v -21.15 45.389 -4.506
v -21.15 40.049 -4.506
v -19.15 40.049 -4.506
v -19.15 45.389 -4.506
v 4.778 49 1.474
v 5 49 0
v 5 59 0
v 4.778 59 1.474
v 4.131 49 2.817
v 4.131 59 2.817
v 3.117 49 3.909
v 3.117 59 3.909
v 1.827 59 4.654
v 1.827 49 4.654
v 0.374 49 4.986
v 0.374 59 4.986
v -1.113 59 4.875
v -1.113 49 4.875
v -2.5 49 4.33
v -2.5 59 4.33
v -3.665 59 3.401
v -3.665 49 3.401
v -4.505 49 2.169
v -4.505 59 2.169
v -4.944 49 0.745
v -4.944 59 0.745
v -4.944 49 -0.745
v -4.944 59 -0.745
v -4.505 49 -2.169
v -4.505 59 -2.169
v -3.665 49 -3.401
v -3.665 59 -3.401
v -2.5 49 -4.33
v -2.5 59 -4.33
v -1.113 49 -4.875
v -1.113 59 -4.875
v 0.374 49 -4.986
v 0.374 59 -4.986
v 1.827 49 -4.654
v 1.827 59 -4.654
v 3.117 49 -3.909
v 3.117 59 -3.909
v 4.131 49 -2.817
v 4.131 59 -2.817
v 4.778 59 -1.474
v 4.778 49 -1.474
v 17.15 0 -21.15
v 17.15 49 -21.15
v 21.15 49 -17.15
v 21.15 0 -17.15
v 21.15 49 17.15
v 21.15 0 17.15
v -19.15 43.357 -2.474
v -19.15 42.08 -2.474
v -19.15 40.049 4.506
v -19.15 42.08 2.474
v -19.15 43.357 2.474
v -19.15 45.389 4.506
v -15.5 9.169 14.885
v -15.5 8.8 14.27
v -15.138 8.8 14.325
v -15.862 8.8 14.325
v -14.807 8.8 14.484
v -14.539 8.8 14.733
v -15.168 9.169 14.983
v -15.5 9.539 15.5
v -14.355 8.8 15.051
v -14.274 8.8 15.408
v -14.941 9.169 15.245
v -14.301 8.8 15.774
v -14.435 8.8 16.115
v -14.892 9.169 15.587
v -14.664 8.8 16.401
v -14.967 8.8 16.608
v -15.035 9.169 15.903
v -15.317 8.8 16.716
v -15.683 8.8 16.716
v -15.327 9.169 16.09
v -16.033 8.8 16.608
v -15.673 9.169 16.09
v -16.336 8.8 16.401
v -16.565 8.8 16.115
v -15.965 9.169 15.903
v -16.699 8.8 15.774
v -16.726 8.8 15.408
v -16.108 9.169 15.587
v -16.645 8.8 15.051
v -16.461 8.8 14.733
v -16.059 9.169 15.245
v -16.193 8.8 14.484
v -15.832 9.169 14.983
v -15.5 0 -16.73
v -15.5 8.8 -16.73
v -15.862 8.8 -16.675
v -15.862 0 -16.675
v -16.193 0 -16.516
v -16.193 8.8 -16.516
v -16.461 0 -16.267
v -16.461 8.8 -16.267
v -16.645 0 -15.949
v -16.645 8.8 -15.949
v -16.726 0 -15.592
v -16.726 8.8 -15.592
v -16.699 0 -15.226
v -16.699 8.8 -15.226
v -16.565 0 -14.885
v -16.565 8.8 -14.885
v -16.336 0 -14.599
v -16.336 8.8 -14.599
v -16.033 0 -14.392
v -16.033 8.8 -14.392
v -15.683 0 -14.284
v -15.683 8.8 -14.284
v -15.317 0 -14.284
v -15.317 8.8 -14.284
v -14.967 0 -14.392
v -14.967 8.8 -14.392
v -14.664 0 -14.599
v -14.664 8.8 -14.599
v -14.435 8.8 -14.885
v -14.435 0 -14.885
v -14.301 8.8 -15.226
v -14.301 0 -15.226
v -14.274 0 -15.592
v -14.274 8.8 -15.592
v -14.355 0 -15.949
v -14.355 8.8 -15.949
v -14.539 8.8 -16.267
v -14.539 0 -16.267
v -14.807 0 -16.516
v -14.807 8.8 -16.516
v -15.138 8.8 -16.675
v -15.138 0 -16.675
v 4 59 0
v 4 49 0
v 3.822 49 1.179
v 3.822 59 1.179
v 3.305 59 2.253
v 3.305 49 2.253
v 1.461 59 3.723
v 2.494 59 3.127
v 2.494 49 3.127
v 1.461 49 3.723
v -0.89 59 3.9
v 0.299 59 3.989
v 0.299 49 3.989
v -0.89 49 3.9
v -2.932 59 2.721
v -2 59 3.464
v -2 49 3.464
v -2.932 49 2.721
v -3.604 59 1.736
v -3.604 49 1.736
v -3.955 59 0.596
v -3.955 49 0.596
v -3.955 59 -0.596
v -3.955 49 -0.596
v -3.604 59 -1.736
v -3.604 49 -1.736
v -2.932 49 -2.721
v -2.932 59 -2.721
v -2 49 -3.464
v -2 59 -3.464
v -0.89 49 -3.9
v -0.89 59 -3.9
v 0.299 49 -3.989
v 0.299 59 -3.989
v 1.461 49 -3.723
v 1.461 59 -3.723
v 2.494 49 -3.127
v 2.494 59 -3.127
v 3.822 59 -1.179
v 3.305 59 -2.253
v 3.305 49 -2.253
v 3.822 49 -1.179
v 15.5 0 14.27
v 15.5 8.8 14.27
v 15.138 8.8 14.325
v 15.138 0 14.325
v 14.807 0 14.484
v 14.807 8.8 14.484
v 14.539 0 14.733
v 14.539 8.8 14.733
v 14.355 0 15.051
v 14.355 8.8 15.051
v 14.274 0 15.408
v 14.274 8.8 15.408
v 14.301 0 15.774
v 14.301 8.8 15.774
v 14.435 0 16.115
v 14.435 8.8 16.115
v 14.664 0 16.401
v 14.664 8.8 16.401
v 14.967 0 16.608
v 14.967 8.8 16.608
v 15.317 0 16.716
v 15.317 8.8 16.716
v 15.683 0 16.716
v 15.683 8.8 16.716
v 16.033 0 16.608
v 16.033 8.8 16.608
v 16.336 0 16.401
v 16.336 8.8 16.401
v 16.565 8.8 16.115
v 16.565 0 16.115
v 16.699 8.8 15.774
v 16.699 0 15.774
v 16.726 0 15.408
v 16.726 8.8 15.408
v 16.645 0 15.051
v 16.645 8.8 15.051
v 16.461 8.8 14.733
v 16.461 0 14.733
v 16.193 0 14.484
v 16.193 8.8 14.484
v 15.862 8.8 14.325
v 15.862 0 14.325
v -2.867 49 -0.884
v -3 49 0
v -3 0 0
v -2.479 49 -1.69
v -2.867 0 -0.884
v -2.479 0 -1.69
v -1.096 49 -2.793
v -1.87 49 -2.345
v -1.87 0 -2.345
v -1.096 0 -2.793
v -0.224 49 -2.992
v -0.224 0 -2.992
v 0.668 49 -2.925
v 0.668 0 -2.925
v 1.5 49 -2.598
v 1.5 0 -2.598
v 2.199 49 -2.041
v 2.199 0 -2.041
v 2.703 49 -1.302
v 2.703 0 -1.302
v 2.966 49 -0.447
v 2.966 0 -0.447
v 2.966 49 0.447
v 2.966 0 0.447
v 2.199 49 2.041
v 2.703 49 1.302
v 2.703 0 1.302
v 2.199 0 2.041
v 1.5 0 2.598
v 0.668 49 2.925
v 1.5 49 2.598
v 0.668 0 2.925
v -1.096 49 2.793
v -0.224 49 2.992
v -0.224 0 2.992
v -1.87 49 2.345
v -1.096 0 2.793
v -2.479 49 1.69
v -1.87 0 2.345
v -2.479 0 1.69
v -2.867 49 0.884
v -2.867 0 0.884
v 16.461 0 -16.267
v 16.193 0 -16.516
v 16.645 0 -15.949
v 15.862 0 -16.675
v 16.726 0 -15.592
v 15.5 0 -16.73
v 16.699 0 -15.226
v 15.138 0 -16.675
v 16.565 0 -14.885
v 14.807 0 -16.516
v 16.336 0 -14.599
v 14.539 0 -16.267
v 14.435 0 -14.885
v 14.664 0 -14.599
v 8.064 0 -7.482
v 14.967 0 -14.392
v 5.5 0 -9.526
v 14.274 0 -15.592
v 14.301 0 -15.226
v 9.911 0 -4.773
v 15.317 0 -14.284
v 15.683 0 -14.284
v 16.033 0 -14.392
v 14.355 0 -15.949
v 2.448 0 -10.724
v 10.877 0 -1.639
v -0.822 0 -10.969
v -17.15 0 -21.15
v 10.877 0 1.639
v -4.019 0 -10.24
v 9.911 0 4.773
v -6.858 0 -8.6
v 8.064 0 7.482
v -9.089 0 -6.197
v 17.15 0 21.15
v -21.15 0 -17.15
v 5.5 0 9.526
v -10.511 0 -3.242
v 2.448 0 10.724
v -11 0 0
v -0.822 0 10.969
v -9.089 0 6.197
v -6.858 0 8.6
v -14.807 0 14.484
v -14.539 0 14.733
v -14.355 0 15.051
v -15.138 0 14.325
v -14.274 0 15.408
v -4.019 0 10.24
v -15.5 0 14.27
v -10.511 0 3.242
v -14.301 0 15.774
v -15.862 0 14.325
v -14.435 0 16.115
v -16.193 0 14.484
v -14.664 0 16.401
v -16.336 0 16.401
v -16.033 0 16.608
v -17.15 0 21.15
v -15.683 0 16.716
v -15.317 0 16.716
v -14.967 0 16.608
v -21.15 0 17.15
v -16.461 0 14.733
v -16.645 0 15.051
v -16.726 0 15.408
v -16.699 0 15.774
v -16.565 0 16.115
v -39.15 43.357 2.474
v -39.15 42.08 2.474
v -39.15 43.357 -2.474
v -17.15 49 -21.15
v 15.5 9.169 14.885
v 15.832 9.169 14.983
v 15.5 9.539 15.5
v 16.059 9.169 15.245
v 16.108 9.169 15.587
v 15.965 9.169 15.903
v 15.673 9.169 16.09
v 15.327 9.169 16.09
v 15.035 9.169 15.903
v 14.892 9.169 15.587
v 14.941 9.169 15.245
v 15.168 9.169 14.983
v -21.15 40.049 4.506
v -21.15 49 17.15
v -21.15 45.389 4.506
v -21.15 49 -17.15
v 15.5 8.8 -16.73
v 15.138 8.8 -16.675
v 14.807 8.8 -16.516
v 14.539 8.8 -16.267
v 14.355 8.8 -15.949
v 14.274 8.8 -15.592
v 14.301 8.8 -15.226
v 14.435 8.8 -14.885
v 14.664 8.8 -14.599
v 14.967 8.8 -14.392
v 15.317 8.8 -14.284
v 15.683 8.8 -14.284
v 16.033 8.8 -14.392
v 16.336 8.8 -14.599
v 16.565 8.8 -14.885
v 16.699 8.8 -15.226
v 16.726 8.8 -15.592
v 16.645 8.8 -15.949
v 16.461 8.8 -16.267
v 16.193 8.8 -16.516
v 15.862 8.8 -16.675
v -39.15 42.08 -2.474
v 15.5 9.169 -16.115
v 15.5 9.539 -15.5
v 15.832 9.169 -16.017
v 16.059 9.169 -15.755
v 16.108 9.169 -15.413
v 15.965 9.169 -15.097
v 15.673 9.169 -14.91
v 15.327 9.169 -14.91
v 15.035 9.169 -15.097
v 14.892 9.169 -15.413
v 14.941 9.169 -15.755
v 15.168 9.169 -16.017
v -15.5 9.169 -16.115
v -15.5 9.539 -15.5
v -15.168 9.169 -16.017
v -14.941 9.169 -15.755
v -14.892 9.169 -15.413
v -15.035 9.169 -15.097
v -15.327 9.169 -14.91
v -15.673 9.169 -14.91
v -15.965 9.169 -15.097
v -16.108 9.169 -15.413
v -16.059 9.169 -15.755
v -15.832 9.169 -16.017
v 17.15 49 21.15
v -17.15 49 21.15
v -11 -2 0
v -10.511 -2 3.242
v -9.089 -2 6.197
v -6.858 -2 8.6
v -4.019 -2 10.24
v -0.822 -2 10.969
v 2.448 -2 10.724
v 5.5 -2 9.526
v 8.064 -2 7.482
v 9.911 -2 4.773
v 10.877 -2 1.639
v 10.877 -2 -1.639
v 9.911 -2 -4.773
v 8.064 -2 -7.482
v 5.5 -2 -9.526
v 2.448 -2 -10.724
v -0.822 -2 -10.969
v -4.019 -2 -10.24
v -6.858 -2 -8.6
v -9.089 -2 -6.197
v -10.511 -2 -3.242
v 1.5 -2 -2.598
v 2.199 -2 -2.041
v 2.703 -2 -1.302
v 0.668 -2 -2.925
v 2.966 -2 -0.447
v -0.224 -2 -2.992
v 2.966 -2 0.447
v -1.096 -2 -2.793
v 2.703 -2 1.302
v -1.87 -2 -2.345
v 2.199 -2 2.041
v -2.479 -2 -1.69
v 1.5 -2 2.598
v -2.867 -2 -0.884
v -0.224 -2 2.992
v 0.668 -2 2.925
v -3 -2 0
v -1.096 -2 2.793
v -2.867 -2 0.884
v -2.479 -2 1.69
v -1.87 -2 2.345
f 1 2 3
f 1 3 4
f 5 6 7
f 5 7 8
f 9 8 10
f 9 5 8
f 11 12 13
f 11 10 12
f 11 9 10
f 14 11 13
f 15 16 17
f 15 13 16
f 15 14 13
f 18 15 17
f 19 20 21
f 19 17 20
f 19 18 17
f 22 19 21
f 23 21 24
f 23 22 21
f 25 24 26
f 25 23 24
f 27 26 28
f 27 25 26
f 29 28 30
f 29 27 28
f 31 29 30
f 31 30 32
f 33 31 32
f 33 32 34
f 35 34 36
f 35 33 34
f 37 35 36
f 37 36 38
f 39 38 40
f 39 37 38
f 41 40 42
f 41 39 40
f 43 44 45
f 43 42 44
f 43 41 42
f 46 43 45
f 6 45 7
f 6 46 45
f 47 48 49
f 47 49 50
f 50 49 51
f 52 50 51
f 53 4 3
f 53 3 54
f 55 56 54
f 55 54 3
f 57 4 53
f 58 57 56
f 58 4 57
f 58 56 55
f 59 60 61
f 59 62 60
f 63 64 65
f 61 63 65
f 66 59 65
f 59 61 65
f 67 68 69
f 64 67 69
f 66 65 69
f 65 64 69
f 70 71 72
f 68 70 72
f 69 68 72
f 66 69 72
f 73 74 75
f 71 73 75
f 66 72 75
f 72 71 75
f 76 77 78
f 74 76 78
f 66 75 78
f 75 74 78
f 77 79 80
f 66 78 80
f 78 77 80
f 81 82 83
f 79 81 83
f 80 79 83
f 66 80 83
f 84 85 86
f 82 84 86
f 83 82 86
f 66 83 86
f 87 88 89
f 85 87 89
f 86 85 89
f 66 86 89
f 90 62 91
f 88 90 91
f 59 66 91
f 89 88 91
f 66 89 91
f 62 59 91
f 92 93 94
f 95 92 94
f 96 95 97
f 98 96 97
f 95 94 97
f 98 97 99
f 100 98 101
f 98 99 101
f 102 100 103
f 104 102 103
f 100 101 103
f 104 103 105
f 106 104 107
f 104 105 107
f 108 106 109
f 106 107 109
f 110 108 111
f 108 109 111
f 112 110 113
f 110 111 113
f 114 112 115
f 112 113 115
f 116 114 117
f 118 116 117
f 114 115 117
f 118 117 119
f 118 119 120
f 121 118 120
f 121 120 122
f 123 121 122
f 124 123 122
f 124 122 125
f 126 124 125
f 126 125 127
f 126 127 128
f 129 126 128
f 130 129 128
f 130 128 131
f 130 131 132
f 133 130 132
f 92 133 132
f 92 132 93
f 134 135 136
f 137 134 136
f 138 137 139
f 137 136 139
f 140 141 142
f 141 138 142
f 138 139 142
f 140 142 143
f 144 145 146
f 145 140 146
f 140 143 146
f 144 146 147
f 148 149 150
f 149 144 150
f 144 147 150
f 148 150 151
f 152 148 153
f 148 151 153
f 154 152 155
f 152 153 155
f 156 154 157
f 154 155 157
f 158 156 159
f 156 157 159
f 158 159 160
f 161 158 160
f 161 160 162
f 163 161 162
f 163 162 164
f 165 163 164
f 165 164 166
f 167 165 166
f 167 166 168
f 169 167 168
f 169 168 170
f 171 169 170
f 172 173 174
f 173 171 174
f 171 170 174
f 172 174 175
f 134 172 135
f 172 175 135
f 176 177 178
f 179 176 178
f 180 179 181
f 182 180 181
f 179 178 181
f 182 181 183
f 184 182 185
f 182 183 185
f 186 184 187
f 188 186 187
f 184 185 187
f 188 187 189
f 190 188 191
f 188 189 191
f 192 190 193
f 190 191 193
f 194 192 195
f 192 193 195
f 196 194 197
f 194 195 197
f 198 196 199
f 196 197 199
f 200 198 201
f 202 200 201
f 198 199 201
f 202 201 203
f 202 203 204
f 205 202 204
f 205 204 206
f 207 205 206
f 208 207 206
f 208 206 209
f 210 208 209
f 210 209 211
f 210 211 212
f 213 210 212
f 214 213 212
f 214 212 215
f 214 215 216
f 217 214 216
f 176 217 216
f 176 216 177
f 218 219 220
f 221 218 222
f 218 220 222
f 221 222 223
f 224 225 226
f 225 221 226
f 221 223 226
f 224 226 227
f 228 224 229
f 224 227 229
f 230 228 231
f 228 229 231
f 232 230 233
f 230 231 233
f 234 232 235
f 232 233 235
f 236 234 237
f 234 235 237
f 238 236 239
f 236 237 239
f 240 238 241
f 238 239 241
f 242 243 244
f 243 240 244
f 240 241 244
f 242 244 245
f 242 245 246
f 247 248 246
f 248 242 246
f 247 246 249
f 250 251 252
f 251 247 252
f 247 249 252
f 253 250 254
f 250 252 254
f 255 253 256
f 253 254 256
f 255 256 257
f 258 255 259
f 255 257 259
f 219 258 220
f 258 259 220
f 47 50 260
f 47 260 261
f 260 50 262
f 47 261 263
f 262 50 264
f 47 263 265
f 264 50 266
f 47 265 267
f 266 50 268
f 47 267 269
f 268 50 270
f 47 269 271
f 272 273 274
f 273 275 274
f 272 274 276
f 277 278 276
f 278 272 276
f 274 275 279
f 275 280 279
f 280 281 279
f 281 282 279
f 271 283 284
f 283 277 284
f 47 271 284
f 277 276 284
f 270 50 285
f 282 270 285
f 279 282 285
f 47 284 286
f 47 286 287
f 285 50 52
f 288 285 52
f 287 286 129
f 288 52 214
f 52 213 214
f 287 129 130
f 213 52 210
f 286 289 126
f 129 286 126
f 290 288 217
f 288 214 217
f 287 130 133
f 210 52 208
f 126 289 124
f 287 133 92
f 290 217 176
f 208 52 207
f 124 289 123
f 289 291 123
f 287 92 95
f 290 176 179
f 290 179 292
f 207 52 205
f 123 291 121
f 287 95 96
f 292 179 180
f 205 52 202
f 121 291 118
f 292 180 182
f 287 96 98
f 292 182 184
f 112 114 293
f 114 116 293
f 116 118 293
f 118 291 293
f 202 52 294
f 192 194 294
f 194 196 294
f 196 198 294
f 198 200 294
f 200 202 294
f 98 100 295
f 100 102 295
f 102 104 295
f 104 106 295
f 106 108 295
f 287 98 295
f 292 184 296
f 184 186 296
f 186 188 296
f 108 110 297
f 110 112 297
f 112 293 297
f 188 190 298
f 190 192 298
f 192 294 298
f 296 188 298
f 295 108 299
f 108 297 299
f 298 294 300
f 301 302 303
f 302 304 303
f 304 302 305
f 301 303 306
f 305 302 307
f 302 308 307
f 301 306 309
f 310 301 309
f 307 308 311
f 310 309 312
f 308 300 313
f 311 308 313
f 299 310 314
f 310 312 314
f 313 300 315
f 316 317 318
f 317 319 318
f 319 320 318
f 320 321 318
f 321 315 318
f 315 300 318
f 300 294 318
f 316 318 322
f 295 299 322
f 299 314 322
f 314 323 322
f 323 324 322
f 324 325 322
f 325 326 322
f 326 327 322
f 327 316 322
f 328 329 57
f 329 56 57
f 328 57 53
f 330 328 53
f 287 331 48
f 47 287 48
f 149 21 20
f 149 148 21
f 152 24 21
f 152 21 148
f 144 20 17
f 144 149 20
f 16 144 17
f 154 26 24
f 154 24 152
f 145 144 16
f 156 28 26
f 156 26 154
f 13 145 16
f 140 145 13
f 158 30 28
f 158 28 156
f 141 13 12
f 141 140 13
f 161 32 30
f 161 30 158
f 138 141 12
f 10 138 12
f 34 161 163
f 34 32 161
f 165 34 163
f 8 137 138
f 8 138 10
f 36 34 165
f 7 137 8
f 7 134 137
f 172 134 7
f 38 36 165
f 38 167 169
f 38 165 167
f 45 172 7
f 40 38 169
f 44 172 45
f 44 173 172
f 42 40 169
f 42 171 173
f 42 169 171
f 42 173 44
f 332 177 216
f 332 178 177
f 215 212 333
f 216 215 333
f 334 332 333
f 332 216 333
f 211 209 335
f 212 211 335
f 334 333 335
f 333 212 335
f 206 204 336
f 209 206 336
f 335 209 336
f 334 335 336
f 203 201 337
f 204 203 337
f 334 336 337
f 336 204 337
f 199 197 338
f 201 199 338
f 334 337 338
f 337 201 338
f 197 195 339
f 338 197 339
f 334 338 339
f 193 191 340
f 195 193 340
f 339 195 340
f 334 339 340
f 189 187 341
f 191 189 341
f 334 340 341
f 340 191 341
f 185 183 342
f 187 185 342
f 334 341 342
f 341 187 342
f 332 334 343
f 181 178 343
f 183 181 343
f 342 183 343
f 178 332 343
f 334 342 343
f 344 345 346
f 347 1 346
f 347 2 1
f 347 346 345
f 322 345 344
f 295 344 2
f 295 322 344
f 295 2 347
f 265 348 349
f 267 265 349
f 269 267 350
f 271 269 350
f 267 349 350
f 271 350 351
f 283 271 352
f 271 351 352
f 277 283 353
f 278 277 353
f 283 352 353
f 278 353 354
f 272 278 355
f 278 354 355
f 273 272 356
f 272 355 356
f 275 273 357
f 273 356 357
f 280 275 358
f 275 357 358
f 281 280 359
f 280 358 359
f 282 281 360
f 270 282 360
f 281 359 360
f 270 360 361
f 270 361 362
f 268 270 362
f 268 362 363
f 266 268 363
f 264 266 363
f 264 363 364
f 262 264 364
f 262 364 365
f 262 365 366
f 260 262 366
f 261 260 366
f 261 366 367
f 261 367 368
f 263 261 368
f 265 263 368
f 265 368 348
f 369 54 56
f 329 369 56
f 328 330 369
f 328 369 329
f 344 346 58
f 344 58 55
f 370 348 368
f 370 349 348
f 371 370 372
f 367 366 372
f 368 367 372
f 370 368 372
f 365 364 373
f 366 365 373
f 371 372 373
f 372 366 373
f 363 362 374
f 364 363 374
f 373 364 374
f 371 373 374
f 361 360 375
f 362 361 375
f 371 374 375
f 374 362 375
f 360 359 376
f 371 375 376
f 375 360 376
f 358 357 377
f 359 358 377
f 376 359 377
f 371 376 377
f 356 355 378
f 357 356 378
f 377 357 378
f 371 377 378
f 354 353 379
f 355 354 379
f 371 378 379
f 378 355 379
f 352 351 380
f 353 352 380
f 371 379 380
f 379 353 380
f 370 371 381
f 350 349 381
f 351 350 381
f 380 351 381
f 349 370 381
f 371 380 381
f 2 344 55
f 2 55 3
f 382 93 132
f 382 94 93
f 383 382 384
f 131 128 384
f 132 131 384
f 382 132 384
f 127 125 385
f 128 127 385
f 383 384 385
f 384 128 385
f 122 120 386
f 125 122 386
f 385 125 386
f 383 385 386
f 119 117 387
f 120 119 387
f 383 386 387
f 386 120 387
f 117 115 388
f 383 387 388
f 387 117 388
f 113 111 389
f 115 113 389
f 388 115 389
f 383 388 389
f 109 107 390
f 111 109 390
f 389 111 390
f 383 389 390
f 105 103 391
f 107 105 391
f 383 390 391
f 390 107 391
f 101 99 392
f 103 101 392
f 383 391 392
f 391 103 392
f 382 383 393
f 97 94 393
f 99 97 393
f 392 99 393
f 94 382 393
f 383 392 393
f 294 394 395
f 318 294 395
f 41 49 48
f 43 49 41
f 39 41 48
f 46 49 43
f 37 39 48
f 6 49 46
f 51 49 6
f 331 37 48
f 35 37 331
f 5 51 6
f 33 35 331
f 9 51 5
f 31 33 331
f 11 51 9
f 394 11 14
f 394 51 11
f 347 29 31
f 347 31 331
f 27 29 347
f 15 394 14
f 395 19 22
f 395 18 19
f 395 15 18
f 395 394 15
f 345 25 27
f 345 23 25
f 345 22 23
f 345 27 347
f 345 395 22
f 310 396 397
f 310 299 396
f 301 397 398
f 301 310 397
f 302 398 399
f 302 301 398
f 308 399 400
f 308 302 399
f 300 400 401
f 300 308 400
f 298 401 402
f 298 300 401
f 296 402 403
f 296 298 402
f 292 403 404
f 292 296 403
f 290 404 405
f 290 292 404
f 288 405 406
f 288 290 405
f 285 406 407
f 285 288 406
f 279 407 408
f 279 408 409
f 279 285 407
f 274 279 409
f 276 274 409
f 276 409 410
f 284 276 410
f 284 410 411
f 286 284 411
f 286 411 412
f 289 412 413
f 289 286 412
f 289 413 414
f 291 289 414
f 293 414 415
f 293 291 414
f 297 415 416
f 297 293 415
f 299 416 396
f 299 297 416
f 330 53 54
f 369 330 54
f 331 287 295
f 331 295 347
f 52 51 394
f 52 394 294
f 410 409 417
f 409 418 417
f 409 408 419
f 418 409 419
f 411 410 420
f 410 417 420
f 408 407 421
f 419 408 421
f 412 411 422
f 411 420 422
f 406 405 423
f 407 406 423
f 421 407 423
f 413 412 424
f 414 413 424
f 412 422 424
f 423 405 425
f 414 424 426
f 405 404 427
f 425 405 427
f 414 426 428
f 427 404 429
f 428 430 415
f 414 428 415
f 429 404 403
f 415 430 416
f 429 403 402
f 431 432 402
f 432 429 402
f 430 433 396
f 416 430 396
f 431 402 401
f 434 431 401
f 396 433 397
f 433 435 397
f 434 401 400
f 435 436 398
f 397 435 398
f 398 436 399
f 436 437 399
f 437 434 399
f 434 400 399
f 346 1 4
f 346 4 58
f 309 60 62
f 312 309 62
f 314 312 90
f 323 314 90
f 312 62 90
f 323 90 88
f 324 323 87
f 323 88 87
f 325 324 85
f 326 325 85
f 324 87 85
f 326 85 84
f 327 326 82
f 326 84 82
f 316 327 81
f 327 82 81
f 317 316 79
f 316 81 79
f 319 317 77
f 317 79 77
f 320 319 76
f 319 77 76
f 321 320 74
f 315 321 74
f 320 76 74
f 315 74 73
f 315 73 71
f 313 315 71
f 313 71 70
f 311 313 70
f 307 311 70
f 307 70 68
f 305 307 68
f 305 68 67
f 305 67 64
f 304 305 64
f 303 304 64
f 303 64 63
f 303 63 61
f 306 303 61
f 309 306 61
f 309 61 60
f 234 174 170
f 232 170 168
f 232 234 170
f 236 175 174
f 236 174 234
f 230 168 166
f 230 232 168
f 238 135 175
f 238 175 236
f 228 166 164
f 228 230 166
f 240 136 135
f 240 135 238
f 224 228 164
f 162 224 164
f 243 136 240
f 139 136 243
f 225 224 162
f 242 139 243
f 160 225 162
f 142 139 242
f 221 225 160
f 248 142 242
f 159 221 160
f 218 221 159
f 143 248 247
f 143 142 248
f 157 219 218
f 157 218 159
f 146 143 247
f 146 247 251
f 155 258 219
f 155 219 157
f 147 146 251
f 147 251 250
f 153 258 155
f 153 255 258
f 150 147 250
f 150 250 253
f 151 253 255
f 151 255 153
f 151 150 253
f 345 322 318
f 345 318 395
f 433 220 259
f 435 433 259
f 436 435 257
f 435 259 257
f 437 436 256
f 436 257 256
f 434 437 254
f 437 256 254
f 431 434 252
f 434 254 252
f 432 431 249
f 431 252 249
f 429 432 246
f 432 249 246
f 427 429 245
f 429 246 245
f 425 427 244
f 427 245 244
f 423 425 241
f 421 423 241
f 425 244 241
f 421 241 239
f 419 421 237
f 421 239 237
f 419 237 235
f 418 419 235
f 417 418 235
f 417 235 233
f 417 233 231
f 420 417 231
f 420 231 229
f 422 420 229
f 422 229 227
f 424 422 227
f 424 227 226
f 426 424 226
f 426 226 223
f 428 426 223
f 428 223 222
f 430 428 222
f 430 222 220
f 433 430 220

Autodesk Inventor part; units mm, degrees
ref_plane "YZ Plane" through (0, 0, 0) normal (1, 0, 0) x (0, 1, 0)
ref_plane "XZ Plane" through (0, 0, 0) normal (0, 1, 0) x (-1, 0, 0)
ref_plane "XY Plane" through (0, 0, 0) normal (0, 0, 1) x (1, 0, 0)
sketch "Sketch1" plane through (0, 0, 0) normal (0, 1, 0) x (-1, 0, 0)
  line L0 (-21.15, 21.15) -> (21.15, 21.15)
  line L1 (21.15, 21.15) -> (21.15, -21.15)
  line L2 (21.15, -21.15) -> (-21.15, -21.15)
  line L3 (-21.15, -21.15) -> (-21.15, 21.15)
  line L4 (-21.15, 21.15) -> (21.15, -21.15) construction
  line L5 (21.15, 21.15) -> (-21.15, -21.15) construction
  circle A0 centre (0, 0) radius 3
  circle A1 centre (0, 0) radius 11
  line L6 (15.5, 15.5) -> (-15.5, 15.5)
  line L7 (-15.5, 15.5) -> (-15.5, -15.5)
  line L8 (-15.5, -15.5) -> (15.5, -15.5)
  line L9 (15.5, -15.5) -> (15.5, 15.5)
  line L10 (15.5, 15.5) -> (-15.5, -15.5) construction
  line L11 (-15.5, 15.5) -> (15.5, -15.5) construction
  dimension "d0" = 42.3
  dimension "d10" = 6
  dimension "d11" = 22
  dimension "d18" = 31
extrude "Extrusion1" add sketch "Sketch1" along normal blind 49 contours L0 L1 L2 L3 | A1 | L9 L8 L7 L6
sketch "Sketch2" plane through (-21.15, 0, -21.15) normal (-1, 0, 0) x (0, 0, 1)
  line L0 (25.6555, 40.0488) -> (16.6445, 40.0488)
  line L1 (16.6445, 40.0488) -> (16.6445, 45.3886)
  line L2 (16.6445, 45.3886) -> (25.6555, 45.3886)
  line L3 (25.6555, 45.3886) -> (25.6555, 40.0488)
  line L4 (25.6555, 40.0488) -> (16.6445, 45.3886) construction
  line L5 (16.6445, 40.0488) -> (25.6555, 45.3886) construction
  line L6 (42.3, 0) -> (0, 0) projected
  point P0 (21.15, 0)
  point P1 (21.15, 42.7187)
  point P2 (21.15, 40.0488)
  point P3 (21.15, 0)
extrude "Extrusion2" cut sketch "Sketch2" against normal blind 2
sketch "Sketch3" plane through (-19.15, 0, -21.15) normal (-1, 0, 0) x (0, 0, 1)
  line L0 (25.6555, 40.0488) -> (16.6445, 40.0488) projected
  line L1 (25.6555, 45.3886) -> (25.6555, 40.0488) projected
  line L2 (16.6445, 45.3886) -> (25.6555, 45.3886) projected
  line L3 (16.6445, 40.0488) -> (16.6445, 45.3886) projected
  line L4 (18.676, 42.0802) -> (23.624, 42.0802)
  line L5 (23.624, 42.0802) -> (23.624, 43.3572)
  line L6 (23.624, 43.3572) -> (18.676, 43.3572)
  line L7 (18.676, 43.3572) -> (18.676, 42.0802)
  point P0 (21.15, 0)
extrude "Extrusion3" add sketch "Sketch3" along normal blind 20 contours L7 L6 L5 L4
chamfer "Chamfer1" distance 4 angle 45 4 edges at (-21.15, 24.5, 21.15) (21.15, 24.5, 21.15) (21.15, 24.5, -21.15) (-21.15, 24.5, -21.15)
extrude "Extrusion4" add sketch "Sketch1" against normal blind 2 contours A1
sketch "Sketch4" plane through (0, 49, 0) normal (0, 1, 0) x (1, 0, 0)
  circle A0 centre (0, 0) radius 5
  circle A1 centre (0, 0) radius 4
  dimension "d14" = 10
  dimension "d15" = 1
extrude "Extrusion5" add sketch "Sketch4" along normal blind 10
hole "Hole1" at (-15.5, 0, -15.5) at (15.5, 0, -15.5) at (15.5, 0, 15.5) at (-15.5, 0, 15.5) direction (0, 1, 0) diameter 2.459 depth 8.8 tip angle 118 thread size "M3x0.5" class "6H" standard "ISO Metric profile"
properties part number "L4118L1804-T6X1 — LINEAR ACTUATOR"
